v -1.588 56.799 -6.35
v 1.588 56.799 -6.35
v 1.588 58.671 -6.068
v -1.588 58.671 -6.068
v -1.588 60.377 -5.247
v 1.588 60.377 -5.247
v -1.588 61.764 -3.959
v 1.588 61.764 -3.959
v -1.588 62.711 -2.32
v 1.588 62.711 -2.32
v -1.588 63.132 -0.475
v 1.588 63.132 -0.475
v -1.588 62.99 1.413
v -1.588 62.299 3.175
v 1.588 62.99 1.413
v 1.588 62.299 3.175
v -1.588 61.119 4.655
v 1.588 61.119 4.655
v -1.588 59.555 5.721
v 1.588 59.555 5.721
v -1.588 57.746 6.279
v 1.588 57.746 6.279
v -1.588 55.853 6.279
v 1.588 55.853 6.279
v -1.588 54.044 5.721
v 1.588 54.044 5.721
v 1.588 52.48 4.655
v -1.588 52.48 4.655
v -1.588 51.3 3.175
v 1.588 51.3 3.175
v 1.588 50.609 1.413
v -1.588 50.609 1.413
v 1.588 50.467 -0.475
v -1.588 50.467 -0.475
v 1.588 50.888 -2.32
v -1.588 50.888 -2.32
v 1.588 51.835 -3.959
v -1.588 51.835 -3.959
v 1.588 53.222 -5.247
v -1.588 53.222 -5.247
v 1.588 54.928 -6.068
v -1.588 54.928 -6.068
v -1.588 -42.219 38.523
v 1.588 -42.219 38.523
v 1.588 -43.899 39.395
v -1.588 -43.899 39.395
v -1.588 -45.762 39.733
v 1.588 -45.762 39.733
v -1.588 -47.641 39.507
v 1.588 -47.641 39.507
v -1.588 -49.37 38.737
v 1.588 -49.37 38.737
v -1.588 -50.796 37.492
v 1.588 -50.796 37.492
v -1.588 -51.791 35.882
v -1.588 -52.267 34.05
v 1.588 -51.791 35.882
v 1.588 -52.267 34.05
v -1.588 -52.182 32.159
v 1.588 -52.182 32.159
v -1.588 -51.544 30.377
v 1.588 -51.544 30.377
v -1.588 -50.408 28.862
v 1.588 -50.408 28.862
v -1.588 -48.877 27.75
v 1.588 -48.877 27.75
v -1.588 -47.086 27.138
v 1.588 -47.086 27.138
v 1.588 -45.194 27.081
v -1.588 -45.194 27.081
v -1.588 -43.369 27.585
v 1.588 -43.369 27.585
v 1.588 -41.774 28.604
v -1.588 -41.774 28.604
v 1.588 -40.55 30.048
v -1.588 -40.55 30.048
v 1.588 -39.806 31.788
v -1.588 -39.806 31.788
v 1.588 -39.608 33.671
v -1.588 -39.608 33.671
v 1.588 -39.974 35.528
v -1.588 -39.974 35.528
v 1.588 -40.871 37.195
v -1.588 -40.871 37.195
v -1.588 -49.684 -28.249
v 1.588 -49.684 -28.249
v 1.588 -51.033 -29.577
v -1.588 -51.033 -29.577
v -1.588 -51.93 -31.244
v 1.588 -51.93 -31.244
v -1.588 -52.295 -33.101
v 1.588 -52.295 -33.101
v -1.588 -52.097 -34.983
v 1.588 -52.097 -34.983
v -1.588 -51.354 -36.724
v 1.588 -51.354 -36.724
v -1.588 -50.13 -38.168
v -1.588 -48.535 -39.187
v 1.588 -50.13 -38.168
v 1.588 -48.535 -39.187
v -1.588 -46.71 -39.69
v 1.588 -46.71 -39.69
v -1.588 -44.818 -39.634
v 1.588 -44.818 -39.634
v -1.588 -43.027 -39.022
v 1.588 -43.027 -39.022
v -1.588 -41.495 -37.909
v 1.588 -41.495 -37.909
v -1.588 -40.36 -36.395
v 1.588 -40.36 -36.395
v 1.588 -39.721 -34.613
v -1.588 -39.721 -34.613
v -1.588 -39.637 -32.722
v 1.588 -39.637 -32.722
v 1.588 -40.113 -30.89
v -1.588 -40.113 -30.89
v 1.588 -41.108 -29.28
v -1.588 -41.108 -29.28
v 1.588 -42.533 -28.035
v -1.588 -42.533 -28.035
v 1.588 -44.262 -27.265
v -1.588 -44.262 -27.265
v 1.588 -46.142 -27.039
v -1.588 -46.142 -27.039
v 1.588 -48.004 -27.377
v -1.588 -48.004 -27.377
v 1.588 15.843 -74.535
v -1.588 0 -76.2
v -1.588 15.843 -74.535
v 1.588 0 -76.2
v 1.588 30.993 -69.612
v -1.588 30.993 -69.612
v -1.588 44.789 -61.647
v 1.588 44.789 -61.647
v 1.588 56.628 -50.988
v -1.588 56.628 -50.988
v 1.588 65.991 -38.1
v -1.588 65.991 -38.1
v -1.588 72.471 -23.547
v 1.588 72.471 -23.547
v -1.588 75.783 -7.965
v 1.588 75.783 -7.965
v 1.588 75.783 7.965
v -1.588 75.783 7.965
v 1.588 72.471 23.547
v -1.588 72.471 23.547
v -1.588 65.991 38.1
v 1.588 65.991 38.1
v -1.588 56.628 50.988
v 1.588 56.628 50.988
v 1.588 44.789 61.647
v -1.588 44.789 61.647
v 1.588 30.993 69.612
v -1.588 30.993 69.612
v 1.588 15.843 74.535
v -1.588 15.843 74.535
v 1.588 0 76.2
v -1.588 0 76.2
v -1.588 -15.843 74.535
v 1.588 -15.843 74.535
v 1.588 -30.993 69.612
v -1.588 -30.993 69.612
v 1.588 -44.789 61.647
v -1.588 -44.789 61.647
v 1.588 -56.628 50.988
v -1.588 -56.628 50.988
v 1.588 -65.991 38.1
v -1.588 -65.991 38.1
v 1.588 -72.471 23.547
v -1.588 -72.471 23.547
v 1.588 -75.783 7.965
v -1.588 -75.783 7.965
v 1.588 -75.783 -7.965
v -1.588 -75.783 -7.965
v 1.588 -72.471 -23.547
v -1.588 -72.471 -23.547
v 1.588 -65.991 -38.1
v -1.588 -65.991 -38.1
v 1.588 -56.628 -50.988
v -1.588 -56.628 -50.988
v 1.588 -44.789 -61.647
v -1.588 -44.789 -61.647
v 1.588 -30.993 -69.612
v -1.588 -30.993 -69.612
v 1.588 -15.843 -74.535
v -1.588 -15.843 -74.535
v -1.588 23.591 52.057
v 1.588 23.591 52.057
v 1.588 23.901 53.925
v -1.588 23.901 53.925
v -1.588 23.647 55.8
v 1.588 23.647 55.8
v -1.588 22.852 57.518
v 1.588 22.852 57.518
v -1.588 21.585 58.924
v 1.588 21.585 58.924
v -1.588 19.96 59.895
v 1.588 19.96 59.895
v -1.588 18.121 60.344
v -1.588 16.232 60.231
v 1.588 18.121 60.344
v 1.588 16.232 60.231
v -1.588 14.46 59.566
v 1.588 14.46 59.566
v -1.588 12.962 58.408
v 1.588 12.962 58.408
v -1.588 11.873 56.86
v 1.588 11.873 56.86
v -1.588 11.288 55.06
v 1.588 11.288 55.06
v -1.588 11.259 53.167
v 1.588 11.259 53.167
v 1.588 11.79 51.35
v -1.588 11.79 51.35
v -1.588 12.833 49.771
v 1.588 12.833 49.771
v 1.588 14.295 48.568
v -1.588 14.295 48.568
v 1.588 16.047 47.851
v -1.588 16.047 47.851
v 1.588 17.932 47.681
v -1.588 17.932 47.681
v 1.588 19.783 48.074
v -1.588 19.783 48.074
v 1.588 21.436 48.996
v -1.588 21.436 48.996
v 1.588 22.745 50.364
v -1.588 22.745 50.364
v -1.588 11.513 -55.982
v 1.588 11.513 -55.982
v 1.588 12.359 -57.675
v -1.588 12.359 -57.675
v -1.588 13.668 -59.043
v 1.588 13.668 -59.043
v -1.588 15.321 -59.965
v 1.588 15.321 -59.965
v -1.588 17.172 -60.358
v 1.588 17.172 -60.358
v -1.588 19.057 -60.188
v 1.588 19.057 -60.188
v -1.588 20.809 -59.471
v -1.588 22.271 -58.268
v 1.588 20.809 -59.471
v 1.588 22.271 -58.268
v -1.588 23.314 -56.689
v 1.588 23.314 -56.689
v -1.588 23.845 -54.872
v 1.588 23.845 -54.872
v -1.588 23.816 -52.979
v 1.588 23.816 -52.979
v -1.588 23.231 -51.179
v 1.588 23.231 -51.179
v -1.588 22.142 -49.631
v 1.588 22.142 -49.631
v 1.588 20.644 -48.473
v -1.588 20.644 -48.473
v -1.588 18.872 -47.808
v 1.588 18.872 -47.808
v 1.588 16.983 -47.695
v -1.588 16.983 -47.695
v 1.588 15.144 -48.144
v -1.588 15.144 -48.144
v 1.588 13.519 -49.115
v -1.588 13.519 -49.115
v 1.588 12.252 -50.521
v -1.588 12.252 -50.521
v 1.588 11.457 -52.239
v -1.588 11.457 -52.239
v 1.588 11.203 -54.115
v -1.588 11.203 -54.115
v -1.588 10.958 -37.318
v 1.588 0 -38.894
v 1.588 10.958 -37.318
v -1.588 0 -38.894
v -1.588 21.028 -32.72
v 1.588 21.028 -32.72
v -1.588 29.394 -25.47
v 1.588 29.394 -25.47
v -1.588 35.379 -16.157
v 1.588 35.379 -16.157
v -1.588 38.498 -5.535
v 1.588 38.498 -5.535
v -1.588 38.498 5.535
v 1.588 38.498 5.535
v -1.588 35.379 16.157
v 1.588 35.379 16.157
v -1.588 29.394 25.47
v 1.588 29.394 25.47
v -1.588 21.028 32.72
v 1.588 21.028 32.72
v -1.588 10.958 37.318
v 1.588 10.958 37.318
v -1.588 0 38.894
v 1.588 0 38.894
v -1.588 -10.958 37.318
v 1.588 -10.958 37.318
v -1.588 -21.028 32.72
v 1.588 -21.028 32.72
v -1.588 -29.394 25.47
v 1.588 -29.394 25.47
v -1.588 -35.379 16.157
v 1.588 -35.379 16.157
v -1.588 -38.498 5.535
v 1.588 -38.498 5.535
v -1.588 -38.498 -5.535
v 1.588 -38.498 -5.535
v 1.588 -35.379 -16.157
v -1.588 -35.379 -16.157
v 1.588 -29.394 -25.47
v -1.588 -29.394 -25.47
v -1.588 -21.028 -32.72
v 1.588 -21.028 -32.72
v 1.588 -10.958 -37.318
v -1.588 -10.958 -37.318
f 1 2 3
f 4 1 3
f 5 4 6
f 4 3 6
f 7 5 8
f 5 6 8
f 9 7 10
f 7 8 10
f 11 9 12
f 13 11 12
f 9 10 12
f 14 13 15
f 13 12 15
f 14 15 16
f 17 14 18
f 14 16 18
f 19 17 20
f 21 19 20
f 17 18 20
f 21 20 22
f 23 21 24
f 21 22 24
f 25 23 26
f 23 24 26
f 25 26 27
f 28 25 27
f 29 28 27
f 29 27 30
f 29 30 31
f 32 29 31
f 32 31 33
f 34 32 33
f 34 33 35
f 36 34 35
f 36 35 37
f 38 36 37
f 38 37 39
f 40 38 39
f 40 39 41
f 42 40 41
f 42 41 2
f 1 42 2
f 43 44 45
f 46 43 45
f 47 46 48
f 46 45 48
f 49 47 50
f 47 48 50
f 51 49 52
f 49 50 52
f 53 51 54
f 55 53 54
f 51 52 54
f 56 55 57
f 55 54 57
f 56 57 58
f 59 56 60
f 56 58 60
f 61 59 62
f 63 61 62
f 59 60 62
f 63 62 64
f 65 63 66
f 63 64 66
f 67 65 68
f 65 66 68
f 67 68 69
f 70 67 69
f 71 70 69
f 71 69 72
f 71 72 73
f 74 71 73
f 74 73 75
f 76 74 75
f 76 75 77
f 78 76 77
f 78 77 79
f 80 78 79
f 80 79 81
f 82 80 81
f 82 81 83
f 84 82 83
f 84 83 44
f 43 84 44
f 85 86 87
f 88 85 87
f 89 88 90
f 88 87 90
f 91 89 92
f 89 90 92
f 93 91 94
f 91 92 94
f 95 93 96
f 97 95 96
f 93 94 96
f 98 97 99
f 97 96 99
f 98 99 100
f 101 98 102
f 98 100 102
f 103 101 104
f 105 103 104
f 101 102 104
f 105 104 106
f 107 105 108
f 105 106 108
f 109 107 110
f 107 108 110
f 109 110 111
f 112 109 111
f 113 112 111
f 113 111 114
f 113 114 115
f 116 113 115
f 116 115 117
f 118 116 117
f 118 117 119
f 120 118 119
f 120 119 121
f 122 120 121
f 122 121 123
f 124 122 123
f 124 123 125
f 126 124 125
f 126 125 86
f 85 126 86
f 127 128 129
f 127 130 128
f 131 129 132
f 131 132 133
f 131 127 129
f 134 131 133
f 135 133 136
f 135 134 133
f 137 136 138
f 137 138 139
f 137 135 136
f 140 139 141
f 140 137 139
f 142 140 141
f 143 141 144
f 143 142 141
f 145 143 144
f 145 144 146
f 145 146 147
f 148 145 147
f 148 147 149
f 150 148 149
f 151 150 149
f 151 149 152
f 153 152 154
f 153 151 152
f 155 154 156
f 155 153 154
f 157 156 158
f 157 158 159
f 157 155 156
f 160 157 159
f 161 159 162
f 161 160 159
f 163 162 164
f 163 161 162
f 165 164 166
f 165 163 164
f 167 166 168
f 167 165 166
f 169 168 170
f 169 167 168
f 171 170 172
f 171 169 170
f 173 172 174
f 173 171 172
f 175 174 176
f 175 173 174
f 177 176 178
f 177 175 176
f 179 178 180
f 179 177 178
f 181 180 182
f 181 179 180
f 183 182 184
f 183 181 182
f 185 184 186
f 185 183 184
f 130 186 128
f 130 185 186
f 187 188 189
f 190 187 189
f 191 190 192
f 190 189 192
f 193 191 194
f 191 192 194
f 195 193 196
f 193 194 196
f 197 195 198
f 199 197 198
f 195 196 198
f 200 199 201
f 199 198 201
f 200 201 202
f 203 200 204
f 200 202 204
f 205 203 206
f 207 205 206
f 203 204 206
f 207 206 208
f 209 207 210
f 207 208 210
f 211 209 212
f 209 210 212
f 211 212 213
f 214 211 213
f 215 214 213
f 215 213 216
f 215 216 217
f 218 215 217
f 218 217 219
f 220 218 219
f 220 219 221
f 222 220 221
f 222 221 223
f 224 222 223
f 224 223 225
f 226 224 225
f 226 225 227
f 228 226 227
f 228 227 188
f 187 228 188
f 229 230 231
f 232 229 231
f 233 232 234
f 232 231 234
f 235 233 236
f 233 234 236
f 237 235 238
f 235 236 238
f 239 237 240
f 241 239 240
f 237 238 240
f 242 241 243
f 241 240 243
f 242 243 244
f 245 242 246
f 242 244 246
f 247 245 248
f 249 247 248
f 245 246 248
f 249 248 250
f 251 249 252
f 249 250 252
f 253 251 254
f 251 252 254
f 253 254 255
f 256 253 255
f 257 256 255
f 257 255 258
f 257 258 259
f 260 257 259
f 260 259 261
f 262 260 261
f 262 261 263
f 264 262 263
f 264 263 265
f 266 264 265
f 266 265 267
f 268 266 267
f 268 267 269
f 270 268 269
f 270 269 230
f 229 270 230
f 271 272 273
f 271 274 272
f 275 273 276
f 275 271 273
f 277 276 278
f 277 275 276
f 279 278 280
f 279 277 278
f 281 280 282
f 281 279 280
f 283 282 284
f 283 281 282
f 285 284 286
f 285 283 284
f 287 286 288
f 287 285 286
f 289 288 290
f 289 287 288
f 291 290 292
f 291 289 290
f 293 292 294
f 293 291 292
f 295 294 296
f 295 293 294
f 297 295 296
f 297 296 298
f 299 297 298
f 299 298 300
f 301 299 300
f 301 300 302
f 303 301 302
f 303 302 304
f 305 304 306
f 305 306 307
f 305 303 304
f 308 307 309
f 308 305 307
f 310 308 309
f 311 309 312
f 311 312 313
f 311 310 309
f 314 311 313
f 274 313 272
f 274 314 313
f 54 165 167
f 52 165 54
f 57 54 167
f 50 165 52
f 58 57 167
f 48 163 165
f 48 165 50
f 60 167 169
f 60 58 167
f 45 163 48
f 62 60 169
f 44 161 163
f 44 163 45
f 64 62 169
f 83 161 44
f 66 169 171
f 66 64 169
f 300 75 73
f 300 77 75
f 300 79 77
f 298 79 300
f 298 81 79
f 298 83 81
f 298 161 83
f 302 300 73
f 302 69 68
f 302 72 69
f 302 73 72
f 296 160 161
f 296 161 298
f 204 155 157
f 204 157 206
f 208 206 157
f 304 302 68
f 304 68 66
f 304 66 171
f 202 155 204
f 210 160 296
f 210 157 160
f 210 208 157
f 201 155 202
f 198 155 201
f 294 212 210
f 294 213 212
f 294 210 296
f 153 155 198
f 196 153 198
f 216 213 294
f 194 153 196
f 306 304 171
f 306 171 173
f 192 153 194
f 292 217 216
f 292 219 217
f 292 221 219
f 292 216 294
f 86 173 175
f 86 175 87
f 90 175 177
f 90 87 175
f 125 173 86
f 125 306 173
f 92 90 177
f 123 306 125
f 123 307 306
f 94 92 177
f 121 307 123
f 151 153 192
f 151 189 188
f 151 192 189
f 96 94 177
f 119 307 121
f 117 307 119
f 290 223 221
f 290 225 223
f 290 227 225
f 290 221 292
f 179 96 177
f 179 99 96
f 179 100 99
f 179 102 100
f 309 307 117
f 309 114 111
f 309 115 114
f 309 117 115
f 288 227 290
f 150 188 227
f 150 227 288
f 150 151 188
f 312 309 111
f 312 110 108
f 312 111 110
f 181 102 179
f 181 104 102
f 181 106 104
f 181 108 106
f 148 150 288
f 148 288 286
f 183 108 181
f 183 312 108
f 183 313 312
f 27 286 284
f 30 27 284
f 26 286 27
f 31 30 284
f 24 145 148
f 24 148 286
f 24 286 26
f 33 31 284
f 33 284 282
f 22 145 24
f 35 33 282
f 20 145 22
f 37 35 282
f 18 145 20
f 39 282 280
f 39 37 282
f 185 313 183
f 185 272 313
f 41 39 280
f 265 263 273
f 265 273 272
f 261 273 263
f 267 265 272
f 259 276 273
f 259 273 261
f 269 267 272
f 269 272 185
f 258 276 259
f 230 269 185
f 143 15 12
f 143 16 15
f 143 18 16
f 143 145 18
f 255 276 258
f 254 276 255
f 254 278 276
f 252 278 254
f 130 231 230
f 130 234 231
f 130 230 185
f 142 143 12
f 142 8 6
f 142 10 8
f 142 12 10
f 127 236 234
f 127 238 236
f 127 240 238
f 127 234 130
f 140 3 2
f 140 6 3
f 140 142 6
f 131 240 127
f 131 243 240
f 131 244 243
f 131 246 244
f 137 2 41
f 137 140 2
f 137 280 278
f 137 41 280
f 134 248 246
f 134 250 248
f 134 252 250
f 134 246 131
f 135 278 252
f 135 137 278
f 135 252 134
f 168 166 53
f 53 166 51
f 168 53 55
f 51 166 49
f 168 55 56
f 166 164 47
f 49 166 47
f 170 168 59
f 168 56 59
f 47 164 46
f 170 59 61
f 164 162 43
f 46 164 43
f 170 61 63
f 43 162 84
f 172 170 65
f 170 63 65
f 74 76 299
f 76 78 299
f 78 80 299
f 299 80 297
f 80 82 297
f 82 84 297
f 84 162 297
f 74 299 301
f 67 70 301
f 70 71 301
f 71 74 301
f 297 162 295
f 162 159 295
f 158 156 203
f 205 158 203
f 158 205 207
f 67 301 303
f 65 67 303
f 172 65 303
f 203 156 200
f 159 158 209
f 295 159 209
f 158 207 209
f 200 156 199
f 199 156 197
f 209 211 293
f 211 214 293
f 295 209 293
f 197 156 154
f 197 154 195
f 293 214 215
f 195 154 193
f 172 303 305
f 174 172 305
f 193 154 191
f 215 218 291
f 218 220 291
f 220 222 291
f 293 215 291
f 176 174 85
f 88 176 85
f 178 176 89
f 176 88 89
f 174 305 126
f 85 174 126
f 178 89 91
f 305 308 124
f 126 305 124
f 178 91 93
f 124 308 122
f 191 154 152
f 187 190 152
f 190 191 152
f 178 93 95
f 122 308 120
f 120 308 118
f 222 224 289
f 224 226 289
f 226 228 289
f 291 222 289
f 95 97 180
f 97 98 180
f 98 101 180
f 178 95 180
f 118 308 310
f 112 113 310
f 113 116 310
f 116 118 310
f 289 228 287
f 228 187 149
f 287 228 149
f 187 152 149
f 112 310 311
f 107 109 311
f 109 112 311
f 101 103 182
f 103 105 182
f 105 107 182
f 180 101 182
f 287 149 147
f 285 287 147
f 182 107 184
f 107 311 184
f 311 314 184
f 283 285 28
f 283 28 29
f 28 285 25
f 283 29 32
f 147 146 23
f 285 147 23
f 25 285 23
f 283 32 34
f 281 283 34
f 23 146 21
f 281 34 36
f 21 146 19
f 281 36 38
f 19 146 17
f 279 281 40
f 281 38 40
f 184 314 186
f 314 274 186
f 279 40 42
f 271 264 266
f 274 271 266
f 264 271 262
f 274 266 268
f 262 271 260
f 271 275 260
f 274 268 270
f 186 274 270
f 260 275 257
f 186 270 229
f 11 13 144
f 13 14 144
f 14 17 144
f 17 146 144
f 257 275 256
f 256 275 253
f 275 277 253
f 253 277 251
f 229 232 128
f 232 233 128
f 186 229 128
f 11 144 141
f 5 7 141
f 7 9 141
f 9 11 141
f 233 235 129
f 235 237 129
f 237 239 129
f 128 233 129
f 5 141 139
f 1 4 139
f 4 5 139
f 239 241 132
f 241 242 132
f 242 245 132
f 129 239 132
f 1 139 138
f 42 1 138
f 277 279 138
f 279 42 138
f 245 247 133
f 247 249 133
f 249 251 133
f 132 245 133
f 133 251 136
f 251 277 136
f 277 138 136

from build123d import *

# Parameters (mm, degrees)
SKETCH1_R           = 76.2
SKETCH1_R_2         = 38.89375
BOSS_EXTRUDE1_DEPTH = 1.5875
SKETCH3_R           = 6.35
CUT_EXTRUDE1_DEPTH  = 108.809835474
CIRPATTERN1_COUNT   = 5


with BuildPart() as part:
    # Sketch1 → Boss-Extrude1 (new, symmetric)
    with BuildSketch(Plane(origin=(0, 0, 0), x_dir=(0, 0, -1), z_dir=(1, 0, 0))):
        Circle(SKETCH1_R)
        Circle(SKETCH1_R_2, mode=Mode.SUBTRACT)
    extrude(amount=BOSS_EXTRUDE1_DEPTH, both=True)

    # Sketch3 → Cut-Extrude1 (cut, through all)
    with BuildSketch(Plane(origin=(1.5875, 0, 0), x_dir=(0, 0, -1), z_dir=(1, 0, 0))):
        with Locations((0, 56.79948)):
            Circle(SKETCH3_R)
    cut_extrude1 = extrude(amount=-CUT_EXTRUDE1_DEPTH, mode=Mode.SUBTRACT)

    # CirPattern1: Cut-Extrude1 ×5 about axis
    cirpattern1_axis = Axis((-1.74625, 0, 0), (1, 0, 0))
    for i in range(1, CIRPATTERN1_COUNT):
        add(cut_extrude1.rotate(cirpattern1_axis, i * 360 / CIRPATTERN1_COUNT), mode=Mode.SUBTRACT)


solid = part.part
